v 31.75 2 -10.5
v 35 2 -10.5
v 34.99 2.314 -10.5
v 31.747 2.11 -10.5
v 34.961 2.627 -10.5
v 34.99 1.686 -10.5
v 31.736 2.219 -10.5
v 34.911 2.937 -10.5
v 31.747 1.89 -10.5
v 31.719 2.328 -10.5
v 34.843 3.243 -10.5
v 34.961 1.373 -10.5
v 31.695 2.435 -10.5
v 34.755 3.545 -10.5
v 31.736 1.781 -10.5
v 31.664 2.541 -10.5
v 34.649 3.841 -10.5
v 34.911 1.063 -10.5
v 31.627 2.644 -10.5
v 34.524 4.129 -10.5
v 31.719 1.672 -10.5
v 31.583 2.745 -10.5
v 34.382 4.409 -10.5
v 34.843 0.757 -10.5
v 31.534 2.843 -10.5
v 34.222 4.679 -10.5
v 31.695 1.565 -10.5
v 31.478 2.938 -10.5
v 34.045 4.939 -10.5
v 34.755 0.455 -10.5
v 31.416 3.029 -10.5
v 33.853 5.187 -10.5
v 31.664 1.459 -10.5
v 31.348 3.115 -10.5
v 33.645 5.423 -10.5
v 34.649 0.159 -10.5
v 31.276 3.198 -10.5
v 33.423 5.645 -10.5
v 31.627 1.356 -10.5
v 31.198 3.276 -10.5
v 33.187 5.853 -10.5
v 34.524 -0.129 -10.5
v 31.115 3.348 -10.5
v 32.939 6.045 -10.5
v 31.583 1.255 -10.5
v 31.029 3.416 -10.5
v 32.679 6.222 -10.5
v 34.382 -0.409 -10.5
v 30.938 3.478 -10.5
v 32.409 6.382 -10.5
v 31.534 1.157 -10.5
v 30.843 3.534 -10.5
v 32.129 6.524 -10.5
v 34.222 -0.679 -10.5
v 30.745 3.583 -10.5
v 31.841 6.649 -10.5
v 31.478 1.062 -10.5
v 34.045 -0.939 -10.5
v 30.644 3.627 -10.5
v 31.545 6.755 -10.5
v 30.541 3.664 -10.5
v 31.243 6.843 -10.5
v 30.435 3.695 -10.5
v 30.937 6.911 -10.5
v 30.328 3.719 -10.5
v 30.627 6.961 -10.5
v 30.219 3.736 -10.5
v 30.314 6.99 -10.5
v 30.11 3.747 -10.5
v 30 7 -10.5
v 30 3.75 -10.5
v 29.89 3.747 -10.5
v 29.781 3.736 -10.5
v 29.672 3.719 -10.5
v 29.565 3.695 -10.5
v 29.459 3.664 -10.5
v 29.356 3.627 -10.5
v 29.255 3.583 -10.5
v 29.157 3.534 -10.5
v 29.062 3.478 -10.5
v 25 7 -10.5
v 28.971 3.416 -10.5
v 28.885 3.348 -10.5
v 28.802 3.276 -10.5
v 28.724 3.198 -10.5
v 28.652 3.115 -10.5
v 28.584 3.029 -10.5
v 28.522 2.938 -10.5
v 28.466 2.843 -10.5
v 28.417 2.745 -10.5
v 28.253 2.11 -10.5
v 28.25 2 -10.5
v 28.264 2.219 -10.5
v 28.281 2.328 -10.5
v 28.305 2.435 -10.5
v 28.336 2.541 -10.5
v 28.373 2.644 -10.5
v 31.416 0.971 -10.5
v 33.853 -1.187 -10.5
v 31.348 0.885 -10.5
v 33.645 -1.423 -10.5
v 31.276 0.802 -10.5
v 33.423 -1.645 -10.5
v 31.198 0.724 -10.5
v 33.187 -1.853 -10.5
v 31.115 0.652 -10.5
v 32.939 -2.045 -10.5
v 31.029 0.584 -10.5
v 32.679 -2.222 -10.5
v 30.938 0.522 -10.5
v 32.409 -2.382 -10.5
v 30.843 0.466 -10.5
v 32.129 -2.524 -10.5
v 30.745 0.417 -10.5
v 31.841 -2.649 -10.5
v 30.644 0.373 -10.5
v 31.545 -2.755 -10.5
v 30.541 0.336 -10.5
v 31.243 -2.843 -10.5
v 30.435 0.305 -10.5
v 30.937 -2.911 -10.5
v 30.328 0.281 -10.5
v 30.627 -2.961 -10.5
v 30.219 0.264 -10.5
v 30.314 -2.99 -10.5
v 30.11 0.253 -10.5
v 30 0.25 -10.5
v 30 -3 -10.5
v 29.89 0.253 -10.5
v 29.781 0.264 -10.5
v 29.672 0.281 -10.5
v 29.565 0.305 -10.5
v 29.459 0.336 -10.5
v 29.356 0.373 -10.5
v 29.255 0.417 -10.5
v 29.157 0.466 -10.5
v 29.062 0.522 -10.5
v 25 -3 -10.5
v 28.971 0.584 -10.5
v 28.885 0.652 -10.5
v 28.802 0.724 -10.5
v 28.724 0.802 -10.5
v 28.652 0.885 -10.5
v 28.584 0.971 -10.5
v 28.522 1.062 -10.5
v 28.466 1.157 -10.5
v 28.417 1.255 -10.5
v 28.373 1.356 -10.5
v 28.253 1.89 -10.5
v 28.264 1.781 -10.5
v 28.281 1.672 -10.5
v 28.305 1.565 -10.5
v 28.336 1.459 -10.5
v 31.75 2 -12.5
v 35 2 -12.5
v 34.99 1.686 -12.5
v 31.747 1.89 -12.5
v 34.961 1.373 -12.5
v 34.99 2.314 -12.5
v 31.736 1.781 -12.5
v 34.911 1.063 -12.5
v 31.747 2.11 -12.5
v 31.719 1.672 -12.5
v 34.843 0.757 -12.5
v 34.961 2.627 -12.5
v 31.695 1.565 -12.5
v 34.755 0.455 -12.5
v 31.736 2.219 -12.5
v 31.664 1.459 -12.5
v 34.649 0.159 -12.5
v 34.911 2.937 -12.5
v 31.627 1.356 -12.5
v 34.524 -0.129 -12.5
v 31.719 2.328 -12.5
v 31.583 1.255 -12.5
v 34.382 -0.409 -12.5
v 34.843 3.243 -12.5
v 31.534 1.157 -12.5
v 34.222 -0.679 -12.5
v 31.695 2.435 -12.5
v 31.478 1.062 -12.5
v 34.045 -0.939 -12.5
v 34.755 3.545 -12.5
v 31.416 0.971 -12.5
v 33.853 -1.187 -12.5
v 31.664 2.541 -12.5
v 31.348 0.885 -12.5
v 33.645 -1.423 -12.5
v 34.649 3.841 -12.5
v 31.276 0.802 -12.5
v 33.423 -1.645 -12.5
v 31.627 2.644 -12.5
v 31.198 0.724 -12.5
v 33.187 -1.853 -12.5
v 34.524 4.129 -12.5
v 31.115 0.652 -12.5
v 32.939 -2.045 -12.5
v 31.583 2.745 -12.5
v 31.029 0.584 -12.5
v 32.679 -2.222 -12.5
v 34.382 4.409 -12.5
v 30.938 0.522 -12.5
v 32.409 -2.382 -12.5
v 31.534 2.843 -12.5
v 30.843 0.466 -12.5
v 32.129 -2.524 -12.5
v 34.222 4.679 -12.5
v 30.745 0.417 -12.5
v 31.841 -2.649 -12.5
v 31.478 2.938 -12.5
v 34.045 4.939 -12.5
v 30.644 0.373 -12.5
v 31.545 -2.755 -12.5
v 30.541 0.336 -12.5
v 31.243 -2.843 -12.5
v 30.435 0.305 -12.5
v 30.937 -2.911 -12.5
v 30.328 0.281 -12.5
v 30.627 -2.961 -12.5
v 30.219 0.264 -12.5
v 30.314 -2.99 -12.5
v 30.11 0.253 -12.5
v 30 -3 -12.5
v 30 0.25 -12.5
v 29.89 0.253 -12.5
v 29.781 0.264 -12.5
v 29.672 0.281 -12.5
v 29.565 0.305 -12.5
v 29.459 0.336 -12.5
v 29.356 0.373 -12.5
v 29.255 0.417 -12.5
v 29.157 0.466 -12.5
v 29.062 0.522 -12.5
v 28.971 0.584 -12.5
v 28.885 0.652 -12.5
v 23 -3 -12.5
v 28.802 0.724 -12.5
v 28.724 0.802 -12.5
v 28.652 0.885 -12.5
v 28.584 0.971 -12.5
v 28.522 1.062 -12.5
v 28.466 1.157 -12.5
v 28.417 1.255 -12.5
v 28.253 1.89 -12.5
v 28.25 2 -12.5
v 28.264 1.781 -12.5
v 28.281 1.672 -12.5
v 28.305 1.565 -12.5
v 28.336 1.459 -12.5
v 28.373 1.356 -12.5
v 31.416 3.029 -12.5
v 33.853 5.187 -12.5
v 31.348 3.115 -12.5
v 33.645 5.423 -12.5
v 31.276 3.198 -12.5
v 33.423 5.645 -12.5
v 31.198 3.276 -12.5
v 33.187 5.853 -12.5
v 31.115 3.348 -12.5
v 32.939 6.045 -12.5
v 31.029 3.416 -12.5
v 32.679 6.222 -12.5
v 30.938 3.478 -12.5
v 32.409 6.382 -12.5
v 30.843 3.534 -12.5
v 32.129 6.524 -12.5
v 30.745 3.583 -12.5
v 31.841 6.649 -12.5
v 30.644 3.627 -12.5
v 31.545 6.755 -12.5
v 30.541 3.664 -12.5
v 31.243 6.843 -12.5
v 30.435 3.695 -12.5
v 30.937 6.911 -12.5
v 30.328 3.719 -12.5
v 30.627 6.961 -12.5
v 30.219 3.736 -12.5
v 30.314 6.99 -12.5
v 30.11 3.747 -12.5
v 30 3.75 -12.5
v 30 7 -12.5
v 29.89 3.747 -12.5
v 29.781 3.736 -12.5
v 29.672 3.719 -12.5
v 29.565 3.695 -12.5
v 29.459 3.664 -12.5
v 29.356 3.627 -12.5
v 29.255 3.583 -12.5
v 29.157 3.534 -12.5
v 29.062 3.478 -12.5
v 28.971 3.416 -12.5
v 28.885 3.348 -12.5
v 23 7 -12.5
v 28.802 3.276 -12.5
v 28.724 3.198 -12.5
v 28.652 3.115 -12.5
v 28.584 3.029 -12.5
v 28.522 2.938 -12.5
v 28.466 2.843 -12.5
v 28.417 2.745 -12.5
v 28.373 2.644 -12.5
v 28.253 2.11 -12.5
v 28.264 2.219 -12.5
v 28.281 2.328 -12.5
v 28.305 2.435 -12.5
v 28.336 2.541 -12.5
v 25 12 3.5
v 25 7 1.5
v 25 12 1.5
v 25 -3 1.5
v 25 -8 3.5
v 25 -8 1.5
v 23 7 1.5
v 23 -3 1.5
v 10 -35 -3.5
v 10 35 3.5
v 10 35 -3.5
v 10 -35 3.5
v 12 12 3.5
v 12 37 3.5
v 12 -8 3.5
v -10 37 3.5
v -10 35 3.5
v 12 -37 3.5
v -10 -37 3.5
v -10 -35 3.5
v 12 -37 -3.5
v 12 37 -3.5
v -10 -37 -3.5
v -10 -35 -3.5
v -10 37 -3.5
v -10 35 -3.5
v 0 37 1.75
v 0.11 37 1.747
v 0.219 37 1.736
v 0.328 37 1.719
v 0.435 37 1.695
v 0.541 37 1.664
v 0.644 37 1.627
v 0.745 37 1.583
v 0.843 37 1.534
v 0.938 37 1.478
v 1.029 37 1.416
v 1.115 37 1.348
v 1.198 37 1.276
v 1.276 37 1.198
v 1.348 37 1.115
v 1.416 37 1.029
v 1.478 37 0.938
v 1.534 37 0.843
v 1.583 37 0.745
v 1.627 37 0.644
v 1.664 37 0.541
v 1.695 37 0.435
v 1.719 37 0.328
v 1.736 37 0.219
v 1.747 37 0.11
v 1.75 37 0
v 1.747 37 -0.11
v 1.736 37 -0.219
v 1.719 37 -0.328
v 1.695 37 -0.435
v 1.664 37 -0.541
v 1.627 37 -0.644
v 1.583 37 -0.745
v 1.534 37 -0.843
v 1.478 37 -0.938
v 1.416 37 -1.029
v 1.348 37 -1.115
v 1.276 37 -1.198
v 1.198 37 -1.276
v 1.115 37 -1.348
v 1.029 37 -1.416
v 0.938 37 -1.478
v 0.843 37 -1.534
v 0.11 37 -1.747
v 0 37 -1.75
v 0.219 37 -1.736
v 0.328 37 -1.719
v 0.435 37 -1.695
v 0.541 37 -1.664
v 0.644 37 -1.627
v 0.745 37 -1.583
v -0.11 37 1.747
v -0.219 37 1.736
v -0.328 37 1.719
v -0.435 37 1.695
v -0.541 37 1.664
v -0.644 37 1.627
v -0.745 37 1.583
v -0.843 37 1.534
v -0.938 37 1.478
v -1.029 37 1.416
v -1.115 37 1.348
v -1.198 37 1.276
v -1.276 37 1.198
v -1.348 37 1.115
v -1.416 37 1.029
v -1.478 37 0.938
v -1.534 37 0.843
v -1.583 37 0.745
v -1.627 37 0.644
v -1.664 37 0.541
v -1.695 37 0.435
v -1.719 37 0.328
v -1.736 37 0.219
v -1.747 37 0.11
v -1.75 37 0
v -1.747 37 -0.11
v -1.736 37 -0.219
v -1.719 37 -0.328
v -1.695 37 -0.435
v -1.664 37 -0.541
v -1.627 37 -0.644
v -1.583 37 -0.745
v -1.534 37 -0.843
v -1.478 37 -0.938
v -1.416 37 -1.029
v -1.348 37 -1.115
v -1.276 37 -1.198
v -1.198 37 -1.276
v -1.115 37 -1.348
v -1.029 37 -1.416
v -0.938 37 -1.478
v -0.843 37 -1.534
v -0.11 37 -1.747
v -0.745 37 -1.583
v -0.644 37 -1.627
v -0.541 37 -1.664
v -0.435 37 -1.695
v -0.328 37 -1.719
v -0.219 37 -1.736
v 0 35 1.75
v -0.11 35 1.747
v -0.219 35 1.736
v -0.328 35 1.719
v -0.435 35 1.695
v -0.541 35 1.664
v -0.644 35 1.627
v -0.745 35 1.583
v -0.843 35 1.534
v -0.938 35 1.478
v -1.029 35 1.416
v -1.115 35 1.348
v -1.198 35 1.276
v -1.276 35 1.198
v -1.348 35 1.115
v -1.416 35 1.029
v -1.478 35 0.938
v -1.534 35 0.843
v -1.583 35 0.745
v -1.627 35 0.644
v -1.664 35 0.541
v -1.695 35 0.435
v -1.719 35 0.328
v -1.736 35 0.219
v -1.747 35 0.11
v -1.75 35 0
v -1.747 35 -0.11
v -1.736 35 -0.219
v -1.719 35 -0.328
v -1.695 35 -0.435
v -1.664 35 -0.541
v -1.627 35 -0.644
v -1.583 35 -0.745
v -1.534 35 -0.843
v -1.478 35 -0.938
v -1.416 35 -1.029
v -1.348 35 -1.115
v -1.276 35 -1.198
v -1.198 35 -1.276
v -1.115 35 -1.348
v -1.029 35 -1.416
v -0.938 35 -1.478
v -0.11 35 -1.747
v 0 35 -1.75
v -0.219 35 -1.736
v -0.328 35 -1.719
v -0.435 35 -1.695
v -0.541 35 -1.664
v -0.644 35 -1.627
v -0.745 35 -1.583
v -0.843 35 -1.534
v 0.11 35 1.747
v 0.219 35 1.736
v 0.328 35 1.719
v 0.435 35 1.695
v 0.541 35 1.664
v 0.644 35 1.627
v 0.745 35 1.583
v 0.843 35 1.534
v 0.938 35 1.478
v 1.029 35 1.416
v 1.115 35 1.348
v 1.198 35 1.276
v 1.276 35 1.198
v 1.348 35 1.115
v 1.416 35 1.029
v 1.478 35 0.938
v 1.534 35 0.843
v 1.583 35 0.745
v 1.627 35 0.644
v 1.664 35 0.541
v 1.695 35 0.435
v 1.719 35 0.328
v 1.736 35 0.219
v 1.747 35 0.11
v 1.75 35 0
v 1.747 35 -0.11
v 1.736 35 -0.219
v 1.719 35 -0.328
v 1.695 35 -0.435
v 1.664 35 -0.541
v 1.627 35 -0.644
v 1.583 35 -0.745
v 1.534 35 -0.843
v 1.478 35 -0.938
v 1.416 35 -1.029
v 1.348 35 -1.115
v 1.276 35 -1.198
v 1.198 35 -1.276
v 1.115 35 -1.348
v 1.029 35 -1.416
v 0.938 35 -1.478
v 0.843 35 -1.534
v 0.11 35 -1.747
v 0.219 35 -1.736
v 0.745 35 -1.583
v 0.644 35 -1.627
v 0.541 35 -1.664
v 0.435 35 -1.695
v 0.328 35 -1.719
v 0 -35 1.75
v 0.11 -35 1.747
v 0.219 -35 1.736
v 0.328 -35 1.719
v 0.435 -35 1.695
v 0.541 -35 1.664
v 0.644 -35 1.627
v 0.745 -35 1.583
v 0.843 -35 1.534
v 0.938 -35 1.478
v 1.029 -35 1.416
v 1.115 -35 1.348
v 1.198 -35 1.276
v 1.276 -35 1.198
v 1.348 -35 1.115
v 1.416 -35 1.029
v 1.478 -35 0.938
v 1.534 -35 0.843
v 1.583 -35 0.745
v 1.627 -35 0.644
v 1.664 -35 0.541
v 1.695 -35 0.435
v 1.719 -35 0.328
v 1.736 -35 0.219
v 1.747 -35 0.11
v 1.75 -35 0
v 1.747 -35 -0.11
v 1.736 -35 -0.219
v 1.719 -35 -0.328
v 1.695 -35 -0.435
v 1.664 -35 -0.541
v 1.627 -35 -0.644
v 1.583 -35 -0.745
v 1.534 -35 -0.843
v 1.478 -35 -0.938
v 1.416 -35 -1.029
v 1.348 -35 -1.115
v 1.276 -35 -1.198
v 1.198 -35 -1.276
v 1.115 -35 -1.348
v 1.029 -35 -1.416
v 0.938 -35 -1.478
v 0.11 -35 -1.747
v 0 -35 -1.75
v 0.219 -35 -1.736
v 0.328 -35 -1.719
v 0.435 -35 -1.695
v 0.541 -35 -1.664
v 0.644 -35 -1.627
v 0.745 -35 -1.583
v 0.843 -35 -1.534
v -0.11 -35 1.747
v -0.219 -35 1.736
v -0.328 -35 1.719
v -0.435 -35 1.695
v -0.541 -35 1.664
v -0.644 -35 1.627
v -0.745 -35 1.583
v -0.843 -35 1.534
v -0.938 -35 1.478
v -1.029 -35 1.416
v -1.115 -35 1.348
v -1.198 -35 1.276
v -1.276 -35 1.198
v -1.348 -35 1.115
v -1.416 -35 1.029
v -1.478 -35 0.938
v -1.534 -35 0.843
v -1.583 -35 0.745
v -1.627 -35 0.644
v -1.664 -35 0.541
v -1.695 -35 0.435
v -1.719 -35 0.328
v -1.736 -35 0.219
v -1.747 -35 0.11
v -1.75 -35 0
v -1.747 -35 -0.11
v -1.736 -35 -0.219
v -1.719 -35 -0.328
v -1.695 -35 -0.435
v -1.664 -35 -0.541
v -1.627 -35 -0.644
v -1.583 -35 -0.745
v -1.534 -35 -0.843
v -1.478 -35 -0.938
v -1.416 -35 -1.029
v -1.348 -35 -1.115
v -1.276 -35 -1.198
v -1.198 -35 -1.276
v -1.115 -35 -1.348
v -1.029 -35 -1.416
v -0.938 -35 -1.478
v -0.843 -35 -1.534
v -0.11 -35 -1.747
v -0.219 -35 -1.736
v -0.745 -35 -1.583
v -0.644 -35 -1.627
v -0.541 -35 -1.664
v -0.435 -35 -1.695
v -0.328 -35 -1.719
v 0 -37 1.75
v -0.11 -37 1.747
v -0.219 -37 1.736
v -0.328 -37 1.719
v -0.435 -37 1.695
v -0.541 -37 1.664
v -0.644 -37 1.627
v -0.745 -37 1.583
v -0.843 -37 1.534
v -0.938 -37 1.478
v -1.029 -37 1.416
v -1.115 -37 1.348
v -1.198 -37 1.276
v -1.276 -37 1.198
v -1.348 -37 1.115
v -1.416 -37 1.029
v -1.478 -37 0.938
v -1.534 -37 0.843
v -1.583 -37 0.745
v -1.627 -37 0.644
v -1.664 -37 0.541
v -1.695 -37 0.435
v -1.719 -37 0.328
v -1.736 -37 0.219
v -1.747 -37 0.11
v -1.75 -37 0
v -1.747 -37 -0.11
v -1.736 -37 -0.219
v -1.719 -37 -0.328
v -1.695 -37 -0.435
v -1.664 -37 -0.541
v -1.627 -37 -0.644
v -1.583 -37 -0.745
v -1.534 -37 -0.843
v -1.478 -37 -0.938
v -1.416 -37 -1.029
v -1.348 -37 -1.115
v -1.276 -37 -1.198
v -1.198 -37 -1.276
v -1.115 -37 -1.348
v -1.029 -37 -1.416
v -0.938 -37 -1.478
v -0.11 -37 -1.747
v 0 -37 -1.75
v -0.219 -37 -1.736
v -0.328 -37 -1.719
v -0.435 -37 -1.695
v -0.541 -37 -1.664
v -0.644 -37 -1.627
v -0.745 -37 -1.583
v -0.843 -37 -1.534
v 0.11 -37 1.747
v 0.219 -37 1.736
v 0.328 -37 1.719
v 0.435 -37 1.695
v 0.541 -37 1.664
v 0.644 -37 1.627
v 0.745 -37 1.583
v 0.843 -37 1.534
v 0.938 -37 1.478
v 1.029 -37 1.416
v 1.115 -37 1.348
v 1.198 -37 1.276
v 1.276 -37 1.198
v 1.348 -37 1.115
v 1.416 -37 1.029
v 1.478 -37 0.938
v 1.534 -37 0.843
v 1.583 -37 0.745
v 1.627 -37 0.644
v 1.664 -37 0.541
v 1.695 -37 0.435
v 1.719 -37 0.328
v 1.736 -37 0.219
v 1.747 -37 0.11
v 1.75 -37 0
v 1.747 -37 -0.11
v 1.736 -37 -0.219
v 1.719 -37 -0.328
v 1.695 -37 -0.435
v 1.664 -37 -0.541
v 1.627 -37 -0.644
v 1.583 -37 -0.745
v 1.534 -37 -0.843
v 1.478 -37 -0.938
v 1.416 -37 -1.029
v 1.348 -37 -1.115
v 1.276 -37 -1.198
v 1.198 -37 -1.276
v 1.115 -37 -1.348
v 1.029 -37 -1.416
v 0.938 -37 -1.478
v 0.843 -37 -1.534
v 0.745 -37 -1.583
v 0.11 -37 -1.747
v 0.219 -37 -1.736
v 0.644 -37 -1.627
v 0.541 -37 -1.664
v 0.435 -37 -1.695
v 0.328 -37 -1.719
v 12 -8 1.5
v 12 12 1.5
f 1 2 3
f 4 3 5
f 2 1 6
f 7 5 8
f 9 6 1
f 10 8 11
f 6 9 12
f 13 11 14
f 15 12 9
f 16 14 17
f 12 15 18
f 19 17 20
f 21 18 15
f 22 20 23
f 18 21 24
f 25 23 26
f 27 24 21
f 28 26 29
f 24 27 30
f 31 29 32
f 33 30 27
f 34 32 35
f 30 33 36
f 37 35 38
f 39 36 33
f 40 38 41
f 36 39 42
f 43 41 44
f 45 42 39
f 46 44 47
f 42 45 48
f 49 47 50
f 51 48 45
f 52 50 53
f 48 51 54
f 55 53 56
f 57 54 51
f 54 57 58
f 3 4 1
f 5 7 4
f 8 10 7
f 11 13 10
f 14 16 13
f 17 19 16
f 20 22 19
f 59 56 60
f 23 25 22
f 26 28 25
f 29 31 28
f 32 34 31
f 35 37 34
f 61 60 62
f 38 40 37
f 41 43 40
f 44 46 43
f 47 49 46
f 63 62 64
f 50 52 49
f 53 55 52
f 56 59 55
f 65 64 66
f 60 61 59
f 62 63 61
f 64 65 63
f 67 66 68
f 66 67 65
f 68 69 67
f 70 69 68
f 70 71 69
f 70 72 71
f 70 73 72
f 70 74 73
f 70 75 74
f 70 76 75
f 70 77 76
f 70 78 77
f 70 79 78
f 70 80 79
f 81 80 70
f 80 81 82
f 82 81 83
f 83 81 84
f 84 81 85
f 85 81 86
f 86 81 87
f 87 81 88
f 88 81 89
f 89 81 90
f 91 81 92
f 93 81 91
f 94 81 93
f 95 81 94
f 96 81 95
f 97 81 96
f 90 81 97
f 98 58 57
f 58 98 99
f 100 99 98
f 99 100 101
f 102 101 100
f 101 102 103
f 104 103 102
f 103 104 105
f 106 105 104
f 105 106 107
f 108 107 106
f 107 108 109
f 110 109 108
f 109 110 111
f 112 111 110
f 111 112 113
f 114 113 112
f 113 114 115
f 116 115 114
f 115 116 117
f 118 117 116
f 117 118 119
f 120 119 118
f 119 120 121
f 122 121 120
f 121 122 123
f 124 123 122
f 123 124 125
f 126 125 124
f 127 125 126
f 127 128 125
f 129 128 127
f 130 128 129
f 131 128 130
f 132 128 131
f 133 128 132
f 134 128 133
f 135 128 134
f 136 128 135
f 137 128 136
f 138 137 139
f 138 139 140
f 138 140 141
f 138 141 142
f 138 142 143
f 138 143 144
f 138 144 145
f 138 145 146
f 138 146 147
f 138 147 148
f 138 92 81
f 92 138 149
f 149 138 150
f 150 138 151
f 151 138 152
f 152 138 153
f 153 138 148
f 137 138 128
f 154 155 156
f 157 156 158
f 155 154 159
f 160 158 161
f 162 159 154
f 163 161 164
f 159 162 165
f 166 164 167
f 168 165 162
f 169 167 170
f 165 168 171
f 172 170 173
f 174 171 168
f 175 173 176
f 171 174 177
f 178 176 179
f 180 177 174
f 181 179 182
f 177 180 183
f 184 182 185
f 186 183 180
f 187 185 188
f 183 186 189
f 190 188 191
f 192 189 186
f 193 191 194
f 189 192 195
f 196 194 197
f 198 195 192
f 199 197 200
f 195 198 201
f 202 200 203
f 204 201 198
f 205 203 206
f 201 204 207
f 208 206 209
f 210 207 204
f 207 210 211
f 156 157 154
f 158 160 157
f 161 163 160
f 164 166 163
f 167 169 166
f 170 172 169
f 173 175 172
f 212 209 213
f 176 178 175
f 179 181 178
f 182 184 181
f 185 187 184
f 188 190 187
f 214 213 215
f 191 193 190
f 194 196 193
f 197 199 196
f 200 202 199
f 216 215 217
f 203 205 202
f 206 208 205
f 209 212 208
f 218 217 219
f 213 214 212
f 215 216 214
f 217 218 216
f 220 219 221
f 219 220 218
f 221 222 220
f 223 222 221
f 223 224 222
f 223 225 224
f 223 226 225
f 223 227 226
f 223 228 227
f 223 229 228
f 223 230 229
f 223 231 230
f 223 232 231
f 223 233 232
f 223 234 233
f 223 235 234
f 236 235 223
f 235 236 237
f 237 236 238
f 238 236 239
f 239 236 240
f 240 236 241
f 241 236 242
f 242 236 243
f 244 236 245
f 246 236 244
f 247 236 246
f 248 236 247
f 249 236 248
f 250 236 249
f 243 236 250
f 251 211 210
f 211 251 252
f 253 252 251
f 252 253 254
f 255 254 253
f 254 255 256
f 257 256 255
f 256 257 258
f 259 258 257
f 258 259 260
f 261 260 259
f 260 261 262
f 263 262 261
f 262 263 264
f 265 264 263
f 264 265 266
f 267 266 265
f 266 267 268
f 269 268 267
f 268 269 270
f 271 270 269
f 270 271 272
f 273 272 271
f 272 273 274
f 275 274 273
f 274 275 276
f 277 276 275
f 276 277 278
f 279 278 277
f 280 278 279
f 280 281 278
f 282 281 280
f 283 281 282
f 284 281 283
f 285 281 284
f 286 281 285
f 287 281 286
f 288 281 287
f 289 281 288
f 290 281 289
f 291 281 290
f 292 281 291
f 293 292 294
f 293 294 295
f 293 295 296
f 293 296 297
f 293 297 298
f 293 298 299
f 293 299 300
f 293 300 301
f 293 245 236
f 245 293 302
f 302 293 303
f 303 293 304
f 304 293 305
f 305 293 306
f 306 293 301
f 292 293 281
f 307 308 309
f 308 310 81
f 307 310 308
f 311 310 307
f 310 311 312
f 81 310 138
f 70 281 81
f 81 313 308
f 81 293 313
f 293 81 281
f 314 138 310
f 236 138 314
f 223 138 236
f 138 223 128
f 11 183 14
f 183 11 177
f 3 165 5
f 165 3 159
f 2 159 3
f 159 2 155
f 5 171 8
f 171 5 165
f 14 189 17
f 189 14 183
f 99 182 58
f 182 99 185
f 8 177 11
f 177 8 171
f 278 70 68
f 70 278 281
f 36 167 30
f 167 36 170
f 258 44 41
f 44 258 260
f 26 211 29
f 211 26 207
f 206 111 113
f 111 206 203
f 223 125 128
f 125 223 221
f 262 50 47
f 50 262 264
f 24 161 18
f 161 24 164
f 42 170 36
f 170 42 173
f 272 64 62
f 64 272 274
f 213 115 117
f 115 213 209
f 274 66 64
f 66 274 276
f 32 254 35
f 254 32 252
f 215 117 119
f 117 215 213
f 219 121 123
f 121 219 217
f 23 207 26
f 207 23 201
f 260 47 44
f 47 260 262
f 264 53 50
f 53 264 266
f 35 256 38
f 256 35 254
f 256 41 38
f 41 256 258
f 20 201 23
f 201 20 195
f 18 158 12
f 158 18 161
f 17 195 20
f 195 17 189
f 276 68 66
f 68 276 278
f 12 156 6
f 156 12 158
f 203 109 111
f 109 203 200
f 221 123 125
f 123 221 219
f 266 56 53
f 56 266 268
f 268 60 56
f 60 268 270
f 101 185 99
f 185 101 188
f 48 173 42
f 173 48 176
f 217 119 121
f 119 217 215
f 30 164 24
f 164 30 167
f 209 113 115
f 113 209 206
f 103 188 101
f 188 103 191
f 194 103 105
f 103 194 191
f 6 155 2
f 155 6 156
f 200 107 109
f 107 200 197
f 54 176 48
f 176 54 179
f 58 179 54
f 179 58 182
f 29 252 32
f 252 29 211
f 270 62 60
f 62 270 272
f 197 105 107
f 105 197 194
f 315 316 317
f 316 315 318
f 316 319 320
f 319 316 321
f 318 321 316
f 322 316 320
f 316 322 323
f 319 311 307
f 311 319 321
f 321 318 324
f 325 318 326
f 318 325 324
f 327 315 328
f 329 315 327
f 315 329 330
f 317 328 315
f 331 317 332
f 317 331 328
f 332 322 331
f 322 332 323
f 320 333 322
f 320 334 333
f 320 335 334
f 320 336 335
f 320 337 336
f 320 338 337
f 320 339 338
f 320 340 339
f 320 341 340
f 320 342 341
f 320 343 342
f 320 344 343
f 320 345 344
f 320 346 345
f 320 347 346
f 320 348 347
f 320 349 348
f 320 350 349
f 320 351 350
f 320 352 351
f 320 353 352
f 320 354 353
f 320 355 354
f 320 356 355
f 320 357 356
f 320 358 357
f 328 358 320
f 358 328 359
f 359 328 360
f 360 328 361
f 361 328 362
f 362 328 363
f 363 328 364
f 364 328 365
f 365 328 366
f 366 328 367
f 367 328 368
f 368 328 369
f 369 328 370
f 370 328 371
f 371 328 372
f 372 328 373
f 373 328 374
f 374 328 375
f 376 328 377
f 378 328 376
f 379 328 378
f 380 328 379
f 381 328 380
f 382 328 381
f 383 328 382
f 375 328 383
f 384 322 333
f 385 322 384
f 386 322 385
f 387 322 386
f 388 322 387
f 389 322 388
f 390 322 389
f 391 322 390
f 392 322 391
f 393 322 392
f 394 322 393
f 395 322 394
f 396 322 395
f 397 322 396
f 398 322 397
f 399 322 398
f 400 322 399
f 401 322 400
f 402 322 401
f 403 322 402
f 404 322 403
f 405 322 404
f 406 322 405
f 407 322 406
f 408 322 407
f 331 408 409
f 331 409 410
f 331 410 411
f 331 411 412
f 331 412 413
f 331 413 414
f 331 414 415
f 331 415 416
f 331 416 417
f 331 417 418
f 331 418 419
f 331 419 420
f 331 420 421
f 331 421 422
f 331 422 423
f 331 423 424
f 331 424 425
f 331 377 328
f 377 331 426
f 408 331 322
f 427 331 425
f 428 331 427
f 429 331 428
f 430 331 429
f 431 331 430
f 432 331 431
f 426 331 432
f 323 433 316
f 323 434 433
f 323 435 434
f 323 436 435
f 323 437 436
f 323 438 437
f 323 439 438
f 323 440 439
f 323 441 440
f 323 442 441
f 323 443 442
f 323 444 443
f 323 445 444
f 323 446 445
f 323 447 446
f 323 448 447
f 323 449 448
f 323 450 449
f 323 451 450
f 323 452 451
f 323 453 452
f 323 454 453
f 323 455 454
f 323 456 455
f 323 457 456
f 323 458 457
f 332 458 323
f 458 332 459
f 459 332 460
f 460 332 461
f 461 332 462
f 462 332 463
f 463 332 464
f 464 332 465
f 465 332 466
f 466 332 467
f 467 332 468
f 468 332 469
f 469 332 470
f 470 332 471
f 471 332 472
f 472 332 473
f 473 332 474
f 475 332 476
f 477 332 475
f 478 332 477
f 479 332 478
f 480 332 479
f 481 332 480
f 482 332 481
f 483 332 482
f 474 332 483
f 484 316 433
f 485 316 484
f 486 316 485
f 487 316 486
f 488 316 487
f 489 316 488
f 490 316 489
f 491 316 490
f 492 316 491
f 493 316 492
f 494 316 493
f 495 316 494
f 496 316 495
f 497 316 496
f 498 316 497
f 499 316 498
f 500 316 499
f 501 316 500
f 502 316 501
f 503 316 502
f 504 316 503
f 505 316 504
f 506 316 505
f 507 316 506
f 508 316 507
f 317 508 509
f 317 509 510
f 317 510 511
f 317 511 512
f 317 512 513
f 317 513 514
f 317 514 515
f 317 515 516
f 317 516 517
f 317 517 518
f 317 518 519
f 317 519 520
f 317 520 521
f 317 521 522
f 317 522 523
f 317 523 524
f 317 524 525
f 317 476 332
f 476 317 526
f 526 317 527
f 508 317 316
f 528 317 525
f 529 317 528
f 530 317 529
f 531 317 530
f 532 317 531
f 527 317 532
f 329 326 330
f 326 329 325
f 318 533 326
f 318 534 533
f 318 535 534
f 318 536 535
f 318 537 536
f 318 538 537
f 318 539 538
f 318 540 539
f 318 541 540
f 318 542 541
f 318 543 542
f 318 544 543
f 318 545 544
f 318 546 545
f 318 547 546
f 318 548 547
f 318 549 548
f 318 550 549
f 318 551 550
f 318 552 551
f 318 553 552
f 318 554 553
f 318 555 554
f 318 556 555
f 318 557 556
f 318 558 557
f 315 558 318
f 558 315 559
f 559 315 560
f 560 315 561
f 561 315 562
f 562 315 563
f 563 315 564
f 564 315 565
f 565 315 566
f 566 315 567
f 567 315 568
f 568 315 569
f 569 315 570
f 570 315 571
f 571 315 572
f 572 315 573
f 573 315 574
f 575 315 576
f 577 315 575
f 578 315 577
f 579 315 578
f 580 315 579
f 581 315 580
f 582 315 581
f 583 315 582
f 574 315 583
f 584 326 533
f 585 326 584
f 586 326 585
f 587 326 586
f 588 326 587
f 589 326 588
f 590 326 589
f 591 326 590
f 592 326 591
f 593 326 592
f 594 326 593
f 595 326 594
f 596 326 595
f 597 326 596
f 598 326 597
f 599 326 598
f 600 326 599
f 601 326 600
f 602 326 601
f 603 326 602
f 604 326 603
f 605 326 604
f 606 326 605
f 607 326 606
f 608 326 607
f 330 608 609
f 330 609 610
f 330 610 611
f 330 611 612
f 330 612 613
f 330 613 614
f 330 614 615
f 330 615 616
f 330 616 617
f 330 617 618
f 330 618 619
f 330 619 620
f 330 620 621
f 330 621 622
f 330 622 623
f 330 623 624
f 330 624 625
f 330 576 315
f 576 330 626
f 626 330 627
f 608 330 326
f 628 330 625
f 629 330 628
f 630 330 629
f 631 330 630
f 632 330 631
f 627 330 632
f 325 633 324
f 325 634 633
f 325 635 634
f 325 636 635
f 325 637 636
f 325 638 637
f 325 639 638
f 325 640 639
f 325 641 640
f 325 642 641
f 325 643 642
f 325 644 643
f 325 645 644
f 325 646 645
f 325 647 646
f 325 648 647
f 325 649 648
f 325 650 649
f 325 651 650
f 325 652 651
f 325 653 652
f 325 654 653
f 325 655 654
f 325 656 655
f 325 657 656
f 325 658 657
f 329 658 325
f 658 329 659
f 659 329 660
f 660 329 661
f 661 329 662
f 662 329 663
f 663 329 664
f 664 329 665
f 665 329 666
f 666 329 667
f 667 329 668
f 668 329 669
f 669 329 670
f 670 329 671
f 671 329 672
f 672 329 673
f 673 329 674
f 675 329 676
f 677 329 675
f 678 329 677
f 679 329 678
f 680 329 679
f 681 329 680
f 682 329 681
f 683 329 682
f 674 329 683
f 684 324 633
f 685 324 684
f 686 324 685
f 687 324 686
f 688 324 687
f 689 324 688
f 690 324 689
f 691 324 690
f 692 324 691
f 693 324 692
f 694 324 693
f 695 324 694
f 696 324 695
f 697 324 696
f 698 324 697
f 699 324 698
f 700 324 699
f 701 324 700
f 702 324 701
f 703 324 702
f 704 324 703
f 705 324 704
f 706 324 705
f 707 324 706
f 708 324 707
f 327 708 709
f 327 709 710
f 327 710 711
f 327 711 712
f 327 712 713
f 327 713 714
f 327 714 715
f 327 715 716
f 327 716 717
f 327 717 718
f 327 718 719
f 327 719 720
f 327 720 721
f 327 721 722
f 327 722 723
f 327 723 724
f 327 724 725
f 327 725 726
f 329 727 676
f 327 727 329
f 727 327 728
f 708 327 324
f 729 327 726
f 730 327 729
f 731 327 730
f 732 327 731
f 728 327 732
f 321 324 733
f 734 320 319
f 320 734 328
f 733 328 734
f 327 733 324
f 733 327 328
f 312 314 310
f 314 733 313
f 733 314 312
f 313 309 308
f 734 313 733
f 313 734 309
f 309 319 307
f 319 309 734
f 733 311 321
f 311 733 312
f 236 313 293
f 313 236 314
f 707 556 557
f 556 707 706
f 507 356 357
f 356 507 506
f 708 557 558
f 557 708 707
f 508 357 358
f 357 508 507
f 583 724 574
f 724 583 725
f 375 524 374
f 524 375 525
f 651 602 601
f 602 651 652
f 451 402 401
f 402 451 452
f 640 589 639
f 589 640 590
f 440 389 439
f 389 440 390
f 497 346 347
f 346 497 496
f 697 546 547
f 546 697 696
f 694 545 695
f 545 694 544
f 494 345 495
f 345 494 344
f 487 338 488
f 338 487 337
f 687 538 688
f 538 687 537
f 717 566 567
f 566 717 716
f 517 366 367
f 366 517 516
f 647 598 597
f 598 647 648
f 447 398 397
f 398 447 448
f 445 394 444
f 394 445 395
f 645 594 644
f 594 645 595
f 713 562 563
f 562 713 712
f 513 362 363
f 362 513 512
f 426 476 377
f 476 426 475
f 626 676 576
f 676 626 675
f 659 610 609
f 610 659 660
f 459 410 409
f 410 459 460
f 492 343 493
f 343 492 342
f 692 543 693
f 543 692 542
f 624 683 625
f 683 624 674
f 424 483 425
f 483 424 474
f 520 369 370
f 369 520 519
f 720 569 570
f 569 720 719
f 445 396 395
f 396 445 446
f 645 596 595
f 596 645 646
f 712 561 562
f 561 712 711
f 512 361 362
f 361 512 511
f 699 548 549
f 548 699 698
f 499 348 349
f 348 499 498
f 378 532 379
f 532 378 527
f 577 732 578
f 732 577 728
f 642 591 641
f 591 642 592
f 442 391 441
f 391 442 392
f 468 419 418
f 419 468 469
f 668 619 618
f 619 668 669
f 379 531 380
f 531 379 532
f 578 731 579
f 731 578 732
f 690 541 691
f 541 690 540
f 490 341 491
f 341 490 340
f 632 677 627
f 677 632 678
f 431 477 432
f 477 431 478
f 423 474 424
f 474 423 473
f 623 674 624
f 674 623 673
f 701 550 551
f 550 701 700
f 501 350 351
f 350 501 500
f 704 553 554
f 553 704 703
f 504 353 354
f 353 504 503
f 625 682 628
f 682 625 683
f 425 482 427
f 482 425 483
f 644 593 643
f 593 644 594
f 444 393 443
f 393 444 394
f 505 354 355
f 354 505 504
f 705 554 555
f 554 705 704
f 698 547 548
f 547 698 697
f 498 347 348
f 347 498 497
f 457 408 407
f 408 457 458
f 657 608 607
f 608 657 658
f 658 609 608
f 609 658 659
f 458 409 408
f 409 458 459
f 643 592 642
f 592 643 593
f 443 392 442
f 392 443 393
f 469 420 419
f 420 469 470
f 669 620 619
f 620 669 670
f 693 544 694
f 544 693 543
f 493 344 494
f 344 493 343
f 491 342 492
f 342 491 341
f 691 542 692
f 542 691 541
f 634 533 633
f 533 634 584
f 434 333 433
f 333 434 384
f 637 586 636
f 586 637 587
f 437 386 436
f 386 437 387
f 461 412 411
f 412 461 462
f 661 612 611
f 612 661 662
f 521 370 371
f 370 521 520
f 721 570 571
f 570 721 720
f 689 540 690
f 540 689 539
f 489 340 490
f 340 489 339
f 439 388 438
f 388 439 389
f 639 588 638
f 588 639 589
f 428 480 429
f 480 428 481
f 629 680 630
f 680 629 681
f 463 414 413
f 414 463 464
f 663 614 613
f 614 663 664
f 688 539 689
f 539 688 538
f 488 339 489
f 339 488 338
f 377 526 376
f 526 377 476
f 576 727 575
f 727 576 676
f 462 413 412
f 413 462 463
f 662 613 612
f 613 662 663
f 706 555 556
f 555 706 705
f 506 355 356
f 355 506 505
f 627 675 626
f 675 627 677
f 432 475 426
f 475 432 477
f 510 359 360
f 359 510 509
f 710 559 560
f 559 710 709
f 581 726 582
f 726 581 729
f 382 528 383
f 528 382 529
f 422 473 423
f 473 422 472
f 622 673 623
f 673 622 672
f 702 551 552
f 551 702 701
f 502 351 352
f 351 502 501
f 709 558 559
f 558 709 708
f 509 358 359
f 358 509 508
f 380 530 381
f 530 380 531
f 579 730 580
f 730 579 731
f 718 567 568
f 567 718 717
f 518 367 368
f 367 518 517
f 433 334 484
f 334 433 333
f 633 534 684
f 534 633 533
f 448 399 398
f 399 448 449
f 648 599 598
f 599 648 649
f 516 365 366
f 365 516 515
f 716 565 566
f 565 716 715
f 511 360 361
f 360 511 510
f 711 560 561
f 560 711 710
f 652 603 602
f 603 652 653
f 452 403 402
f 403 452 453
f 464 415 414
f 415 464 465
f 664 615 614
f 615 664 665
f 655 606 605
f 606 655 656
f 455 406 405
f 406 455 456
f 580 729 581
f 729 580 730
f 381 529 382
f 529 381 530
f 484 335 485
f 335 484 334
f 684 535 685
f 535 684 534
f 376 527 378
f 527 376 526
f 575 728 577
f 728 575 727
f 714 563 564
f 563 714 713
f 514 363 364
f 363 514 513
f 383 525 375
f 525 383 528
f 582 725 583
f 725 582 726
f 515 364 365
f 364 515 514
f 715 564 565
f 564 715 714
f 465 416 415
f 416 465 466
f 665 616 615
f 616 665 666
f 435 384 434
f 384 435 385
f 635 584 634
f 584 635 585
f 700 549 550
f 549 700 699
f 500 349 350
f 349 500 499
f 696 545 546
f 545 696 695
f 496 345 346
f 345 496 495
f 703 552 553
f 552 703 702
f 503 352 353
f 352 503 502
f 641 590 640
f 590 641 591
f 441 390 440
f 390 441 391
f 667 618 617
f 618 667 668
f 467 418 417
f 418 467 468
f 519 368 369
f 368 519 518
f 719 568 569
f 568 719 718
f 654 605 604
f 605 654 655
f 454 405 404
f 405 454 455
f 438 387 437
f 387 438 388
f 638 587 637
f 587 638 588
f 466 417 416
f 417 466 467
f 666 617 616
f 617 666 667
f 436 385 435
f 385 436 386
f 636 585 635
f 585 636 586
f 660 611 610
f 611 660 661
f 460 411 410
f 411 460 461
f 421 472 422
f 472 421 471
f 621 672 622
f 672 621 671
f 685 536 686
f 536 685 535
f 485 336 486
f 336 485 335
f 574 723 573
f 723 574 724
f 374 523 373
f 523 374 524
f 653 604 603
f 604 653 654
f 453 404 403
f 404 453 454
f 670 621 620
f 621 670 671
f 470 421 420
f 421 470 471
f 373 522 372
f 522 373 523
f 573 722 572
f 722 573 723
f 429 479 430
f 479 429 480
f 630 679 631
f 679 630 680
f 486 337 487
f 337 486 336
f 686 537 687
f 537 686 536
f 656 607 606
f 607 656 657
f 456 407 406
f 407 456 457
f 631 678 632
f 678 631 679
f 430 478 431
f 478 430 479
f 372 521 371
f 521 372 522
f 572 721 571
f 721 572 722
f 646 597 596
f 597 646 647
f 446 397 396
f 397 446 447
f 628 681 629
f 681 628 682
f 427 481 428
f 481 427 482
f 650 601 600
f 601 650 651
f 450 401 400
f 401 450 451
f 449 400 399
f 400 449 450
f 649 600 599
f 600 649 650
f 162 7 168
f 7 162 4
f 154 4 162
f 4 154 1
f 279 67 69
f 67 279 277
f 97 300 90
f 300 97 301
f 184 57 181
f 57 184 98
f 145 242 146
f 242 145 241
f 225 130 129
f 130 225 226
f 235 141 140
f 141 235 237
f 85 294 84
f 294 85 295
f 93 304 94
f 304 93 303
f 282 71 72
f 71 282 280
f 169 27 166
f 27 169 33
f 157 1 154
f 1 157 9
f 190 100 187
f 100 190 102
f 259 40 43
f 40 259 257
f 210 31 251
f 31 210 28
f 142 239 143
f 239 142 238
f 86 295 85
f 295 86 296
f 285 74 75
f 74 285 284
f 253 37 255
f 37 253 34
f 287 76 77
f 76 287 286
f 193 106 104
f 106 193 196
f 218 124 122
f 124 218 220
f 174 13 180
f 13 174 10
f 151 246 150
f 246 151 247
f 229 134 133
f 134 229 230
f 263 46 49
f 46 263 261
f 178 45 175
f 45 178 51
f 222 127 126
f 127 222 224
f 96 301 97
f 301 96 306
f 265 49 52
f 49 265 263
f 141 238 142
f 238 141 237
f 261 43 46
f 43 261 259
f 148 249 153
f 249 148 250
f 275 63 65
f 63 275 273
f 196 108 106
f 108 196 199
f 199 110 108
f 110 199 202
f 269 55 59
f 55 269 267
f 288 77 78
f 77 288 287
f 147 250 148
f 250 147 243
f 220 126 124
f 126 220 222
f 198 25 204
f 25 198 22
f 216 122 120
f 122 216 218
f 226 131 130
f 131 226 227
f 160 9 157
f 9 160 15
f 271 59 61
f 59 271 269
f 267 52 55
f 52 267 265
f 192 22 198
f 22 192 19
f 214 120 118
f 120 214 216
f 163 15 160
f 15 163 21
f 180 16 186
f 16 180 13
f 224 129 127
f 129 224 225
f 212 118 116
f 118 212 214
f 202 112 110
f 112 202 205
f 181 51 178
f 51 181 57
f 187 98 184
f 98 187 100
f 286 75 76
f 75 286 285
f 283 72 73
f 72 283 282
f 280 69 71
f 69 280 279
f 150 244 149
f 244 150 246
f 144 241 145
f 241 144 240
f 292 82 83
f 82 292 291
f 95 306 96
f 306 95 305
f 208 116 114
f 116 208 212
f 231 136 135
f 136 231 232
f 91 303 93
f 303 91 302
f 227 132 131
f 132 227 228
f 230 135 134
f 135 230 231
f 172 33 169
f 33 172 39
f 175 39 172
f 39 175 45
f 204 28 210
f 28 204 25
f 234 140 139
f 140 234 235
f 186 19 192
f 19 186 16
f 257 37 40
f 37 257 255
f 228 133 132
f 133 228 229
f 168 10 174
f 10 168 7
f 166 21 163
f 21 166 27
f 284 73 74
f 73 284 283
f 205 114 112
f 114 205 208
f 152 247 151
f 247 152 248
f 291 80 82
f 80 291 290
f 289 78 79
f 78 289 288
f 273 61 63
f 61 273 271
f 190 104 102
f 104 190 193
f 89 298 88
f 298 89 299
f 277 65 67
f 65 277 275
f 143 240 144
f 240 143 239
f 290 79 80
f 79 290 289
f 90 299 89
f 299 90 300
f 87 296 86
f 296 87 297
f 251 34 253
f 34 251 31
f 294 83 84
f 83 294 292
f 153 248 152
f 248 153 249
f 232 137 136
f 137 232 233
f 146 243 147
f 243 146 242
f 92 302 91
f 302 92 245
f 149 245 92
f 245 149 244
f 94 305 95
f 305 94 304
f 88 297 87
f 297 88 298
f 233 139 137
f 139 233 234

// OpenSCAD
$hdd_width=70;
$hdd_height=7;
$hdd_arm_length=20;
$hdd_arm_height=$hdd_height;
$hdd_arm_thickness=2;

$hdd_screw_hole_diameter=3.5;
$hdd_screw_hole_offset=10;

$board_mounting_offset=20;
$board_mounting_diameter=3.5;
$bed_mounting_diameter=10;

$board_mounting_arm_length=$board_mounting_offset-$bed_mounting_diameter/2-$hdd_arm_thickness;
$board_mounting_arm_width=20;
$board_mounting_arm_thickness=$hdd_arm_thickness;

$hdd_z_offset=9;
$hdd_y_offset=2;

$bed_mounting_thickness=$board_mounting_arm_thickness;


$fn=100;

difference(){
union(){
//HDD
translate([0,$hdd_width/2+$hdd_arm_thickness/2,0])cube([$hdd_arm_length,$hdd_arm_thickness,$hdd_arm_height], center=true);
translate([0,-$hdd_width/2-$hdd_arm_thickness/2,0])cube([$hdd_arm_length,$hdd_arm_thickness,$hdd_arm_height], center=true);
translate([$hdd_arm_length/2+$hdd_arm_thickness/2,0,0])cube([$hdd_arm_thickness,2*$hdd_arm_thickness+$hdd_width,$hdd_arm_height], center=true);
//board arm  
    translate([$hdd_arm_length/2+$board_mounting_arm_length/2+$hdd_arm_thickness,$hdd_y_offset,$hdd_arm_height/2-$board_mounting_arm_thickness/2]) cube([$board_mounting_arm_length,$board_mounting_arm_width,$board_mounting_arm_thickness],center=true);
//arm-boar-joint
    translate([$hdd_arm_length/2+$board_mounting_arm_length+$hdd_arm_thickness/2,$hdd_y_offset,-$hdd_z_offset/2]) cube([$hdd_arm_thickness,$bed_mounting_diameter,$hdd_z_offset+$hdd_arm_height],center=true);
//board_mounting    
    translate([$hdd_arm_length/2+$board_mounting_offset,$hdd_y_offset,-$hdd_z_offset-$hdd_arm_height/2+$bed_mounting_thickness/2]){
    
        translate([-$bed_mounting_diameter/4,0,0]) cube([$bed_mounting_diameter/2,$bed_mounting_diameter,$bed_mounting_thickness], center=true);
        cylinder(d=$bed_mounting_diameter, h=$bed_mounting_thickness, center=true);
    };
    
};
//hdd_mounting_hole
translate([$hdd_arm_length/2-$hdd_screw_hole_offset,0,0])rotate([90,0,0]) cylinder(d=$hdd_screw_hole_diameter,h=2*$hdd_arm_thickness+$hdd_width, center=true);
//board_mounting_hole
translate([$hdd_arm_length/2+$board_mounting_offset,$hdd_y_offset,0]) cylinder(d=$board_mounting_diameter,h=$hdd_width, center=true);

};
